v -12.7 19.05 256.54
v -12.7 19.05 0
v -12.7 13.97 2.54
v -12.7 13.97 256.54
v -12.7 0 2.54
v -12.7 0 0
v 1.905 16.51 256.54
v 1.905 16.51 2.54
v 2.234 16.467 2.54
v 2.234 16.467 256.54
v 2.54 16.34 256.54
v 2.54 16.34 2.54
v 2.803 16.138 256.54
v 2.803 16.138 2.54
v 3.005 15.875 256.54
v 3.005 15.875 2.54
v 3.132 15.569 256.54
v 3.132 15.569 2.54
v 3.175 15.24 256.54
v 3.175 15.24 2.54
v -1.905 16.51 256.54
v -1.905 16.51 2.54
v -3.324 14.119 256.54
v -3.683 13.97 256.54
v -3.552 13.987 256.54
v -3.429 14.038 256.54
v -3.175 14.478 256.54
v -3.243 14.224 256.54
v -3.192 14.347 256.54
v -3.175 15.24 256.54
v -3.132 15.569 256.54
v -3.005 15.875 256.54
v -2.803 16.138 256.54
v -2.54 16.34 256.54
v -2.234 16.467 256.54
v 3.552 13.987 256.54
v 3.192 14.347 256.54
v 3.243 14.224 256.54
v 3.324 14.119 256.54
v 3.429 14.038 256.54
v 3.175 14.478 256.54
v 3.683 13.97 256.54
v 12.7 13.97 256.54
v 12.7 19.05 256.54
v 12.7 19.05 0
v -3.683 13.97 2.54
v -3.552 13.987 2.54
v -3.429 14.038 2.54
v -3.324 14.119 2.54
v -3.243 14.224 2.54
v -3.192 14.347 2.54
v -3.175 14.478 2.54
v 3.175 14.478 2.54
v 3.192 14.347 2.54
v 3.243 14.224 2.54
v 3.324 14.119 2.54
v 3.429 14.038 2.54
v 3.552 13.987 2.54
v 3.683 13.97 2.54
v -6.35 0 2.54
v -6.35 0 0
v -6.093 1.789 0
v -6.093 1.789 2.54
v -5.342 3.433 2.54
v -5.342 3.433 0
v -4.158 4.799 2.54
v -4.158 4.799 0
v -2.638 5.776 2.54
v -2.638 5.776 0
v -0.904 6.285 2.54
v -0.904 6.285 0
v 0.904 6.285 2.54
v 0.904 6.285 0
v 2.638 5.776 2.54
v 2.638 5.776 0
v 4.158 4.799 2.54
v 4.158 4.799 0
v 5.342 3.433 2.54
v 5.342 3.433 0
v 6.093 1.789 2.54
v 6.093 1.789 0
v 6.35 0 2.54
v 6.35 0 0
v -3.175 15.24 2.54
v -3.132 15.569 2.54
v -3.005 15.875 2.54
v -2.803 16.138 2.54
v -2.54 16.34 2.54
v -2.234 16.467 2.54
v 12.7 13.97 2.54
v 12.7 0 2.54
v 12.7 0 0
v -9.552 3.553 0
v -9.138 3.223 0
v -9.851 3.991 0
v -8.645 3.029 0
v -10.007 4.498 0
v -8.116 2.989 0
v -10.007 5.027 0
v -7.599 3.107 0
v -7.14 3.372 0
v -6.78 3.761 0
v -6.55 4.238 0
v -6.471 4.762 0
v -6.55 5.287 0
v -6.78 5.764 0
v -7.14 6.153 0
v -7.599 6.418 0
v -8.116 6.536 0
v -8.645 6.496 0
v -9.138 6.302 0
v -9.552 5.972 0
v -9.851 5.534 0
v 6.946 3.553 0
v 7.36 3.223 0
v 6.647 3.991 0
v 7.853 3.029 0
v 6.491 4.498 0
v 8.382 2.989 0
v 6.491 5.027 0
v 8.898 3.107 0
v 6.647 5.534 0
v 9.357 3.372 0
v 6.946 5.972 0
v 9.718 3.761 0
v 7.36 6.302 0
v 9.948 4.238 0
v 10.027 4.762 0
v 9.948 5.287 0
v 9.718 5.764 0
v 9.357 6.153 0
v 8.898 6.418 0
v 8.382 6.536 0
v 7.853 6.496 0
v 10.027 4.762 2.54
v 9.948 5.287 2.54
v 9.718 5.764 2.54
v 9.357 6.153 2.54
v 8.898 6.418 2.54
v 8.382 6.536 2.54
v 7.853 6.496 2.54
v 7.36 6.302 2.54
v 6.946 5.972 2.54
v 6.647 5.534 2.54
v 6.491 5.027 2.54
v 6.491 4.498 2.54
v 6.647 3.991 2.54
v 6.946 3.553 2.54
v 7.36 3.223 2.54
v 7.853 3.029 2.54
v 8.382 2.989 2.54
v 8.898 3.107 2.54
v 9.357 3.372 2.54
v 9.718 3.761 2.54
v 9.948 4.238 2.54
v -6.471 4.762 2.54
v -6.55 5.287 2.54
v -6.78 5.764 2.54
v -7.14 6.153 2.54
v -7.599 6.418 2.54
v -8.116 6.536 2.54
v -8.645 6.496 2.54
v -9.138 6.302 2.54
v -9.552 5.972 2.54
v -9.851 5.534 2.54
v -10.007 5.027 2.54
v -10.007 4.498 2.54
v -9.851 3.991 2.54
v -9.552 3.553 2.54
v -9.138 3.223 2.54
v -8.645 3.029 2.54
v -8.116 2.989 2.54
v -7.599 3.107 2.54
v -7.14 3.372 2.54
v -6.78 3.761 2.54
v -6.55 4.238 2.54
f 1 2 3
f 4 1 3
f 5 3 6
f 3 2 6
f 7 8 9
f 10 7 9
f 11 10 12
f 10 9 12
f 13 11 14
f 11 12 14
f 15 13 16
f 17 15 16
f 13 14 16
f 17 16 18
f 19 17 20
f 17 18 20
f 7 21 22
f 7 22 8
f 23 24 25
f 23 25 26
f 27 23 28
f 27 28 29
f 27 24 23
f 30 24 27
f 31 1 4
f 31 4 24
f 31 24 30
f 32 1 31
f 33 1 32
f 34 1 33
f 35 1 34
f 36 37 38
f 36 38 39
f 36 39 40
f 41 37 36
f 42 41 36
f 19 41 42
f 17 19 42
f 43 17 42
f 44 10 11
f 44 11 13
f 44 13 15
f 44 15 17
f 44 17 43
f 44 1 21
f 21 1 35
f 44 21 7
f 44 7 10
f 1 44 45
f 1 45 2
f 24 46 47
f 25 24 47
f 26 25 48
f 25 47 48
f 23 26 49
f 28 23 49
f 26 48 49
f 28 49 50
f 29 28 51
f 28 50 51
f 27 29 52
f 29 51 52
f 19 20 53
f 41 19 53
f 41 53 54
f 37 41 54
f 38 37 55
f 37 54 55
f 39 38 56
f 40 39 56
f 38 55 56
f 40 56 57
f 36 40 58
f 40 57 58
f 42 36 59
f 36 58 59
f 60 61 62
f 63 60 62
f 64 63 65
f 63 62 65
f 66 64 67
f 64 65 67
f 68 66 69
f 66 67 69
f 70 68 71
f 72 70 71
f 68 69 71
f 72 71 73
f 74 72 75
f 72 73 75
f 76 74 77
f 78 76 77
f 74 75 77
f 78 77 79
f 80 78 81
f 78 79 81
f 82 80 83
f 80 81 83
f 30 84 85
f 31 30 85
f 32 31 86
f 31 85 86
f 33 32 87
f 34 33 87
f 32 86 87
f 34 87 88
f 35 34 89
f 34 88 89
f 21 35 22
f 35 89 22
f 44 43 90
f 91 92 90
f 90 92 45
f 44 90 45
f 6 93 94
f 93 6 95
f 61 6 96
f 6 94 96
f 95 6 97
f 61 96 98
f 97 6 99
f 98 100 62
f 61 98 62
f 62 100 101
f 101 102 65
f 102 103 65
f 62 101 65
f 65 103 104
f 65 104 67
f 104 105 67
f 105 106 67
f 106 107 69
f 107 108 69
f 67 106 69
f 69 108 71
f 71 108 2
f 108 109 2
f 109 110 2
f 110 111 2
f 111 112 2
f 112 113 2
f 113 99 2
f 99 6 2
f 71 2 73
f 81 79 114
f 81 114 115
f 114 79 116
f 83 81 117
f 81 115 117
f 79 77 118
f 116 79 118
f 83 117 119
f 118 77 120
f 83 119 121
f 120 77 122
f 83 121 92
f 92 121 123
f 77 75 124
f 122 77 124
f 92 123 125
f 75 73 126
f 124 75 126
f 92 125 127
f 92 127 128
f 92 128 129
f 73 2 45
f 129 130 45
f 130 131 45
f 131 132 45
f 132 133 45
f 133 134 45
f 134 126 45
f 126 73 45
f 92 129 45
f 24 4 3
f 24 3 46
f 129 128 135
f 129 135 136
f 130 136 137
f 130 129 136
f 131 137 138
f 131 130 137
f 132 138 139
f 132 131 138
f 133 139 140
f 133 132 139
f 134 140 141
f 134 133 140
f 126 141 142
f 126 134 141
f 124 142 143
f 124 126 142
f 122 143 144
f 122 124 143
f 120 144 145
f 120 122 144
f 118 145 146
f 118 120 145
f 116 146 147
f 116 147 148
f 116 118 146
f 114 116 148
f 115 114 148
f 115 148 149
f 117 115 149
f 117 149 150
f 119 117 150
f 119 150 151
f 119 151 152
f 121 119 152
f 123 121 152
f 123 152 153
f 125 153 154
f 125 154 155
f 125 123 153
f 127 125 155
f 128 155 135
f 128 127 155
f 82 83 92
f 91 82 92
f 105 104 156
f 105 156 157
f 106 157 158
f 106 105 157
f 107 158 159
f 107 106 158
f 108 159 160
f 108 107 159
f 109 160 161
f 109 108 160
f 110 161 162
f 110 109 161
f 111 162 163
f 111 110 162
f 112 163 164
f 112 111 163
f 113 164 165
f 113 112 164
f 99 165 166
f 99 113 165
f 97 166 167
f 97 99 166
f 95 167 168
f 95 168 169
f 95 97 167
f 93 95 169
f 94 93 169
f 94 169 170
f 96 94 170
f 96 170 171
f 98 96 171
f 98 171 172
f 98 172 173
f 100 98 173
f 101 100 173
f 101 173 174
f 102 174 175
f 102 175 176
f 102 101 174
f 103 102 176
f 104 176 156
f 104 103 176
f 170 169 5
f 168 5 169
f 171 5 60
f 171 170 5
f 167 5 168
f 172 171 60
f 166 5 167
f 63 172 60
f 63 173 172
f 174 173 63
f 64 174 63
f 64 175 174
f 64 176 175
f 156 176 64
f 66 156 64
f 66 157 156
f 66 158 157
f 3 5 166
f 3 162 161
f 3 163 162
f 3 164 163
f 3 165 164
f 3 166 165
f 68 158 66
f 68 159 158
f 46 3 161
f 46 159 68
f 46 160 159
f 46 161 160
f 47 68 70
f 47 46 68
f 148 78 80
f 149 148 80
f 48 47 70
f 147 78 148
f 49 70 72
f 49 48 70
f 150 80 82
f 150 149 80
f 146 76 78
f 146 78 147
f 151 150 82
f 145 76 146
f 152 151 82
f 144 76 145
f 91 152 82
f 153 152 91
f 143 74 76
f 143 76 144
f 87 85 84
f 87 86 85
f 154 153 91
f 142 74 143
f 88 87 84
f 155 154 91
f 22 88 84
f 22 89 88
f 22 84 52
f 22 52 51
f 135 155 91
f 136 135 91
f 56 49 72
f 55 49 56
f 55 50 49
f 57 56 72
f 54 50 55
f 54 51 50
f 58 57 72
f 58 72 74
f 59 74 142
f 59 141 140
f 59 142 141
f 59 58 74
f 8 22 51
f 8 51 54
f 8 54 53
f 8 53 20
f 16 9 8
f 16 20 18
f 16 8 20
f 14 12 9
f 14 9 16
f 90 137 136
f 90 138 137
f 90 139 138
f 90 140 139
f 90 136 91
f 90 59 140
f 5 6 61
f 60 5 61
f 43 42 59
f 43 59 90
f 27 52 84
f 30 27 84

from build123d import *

# Parameters (mm, degrees)
SKETCH2_R           = 1.778
BOSS_EXTRUDE1_DEPTH = 2.54
BOSS_EXTRUDE2_DEPTH = 254


with BuildPart() as part:
    # Sketch2 → Boss-Extrude1 (new body)
    with BuildSketch(Plane.XY):
        with BuildLine():
            Line((-12.7, 0), (-6.35, 0))
            ThreePointArc((-6.35, 0), (0, 6.35), (6.35, 0))
            Line((6.35, 0), (12.7, 0))
            Line((12.7, 0), (12.7, 19.05))
            Line((12.7, 19.05), (-12.7, 19.05))
            Line((-12.7, 19.05), (-12.7, 0))
        make_face()
        with Locations((-8.248891971, 4.7625)):
            Circle(SKETCH2_R, mode=Mode.SUBTRACT)
        with Locations((8.248891971, 4.7625)):
            Circle(SKETCH2_R, mode=Mode.SUBTRACT)
    extrude(amount=BOSS_EXTRUDE1_DEPTH)

    # Sketch3 → Boss-Extrude2 (add)
    with BuildSketch(Plane.XY.offset(2.54)):
        with BuildLine():
            Line((-12.7, 19.05), (-12.7, 13.97))
            Line((-12.7, 13.97), (-3.683, 13.97))
            ThreePointArc((-3.683, 13.97), (-3.323789755, 14.118789755), (-3.175, 14.478))
            Line((-3.175, 14.478), (-3.175, 15.24))
            ThreePointArc((-3.175, 15.24), (-2.803025612, 16.138025612), (-1.905, 16.51))
            Line((-1.905, 16.51), (1.905, 16.51))
            ThreePointArc((1.905, 16.51), (2.803025612, 16.138025612), (3.175, 15.24))
            Line((3.175, 15.24), (3.175, 14.478))
            ThreePointArc((3.175, 14.478), (3.323789755, 14.118789755), (3.683, 13.97))
            Line((3.683, 13.97), (12.7, 13.97))
            Line((12.7, 13.97), (12.7, 19.05))
            Line((12.7, 19.05), (-12.7, 19.05))
        make_face()
    extrude(amount=BOSS_EXTRUDE2_DEPTH)


solid = part.part
